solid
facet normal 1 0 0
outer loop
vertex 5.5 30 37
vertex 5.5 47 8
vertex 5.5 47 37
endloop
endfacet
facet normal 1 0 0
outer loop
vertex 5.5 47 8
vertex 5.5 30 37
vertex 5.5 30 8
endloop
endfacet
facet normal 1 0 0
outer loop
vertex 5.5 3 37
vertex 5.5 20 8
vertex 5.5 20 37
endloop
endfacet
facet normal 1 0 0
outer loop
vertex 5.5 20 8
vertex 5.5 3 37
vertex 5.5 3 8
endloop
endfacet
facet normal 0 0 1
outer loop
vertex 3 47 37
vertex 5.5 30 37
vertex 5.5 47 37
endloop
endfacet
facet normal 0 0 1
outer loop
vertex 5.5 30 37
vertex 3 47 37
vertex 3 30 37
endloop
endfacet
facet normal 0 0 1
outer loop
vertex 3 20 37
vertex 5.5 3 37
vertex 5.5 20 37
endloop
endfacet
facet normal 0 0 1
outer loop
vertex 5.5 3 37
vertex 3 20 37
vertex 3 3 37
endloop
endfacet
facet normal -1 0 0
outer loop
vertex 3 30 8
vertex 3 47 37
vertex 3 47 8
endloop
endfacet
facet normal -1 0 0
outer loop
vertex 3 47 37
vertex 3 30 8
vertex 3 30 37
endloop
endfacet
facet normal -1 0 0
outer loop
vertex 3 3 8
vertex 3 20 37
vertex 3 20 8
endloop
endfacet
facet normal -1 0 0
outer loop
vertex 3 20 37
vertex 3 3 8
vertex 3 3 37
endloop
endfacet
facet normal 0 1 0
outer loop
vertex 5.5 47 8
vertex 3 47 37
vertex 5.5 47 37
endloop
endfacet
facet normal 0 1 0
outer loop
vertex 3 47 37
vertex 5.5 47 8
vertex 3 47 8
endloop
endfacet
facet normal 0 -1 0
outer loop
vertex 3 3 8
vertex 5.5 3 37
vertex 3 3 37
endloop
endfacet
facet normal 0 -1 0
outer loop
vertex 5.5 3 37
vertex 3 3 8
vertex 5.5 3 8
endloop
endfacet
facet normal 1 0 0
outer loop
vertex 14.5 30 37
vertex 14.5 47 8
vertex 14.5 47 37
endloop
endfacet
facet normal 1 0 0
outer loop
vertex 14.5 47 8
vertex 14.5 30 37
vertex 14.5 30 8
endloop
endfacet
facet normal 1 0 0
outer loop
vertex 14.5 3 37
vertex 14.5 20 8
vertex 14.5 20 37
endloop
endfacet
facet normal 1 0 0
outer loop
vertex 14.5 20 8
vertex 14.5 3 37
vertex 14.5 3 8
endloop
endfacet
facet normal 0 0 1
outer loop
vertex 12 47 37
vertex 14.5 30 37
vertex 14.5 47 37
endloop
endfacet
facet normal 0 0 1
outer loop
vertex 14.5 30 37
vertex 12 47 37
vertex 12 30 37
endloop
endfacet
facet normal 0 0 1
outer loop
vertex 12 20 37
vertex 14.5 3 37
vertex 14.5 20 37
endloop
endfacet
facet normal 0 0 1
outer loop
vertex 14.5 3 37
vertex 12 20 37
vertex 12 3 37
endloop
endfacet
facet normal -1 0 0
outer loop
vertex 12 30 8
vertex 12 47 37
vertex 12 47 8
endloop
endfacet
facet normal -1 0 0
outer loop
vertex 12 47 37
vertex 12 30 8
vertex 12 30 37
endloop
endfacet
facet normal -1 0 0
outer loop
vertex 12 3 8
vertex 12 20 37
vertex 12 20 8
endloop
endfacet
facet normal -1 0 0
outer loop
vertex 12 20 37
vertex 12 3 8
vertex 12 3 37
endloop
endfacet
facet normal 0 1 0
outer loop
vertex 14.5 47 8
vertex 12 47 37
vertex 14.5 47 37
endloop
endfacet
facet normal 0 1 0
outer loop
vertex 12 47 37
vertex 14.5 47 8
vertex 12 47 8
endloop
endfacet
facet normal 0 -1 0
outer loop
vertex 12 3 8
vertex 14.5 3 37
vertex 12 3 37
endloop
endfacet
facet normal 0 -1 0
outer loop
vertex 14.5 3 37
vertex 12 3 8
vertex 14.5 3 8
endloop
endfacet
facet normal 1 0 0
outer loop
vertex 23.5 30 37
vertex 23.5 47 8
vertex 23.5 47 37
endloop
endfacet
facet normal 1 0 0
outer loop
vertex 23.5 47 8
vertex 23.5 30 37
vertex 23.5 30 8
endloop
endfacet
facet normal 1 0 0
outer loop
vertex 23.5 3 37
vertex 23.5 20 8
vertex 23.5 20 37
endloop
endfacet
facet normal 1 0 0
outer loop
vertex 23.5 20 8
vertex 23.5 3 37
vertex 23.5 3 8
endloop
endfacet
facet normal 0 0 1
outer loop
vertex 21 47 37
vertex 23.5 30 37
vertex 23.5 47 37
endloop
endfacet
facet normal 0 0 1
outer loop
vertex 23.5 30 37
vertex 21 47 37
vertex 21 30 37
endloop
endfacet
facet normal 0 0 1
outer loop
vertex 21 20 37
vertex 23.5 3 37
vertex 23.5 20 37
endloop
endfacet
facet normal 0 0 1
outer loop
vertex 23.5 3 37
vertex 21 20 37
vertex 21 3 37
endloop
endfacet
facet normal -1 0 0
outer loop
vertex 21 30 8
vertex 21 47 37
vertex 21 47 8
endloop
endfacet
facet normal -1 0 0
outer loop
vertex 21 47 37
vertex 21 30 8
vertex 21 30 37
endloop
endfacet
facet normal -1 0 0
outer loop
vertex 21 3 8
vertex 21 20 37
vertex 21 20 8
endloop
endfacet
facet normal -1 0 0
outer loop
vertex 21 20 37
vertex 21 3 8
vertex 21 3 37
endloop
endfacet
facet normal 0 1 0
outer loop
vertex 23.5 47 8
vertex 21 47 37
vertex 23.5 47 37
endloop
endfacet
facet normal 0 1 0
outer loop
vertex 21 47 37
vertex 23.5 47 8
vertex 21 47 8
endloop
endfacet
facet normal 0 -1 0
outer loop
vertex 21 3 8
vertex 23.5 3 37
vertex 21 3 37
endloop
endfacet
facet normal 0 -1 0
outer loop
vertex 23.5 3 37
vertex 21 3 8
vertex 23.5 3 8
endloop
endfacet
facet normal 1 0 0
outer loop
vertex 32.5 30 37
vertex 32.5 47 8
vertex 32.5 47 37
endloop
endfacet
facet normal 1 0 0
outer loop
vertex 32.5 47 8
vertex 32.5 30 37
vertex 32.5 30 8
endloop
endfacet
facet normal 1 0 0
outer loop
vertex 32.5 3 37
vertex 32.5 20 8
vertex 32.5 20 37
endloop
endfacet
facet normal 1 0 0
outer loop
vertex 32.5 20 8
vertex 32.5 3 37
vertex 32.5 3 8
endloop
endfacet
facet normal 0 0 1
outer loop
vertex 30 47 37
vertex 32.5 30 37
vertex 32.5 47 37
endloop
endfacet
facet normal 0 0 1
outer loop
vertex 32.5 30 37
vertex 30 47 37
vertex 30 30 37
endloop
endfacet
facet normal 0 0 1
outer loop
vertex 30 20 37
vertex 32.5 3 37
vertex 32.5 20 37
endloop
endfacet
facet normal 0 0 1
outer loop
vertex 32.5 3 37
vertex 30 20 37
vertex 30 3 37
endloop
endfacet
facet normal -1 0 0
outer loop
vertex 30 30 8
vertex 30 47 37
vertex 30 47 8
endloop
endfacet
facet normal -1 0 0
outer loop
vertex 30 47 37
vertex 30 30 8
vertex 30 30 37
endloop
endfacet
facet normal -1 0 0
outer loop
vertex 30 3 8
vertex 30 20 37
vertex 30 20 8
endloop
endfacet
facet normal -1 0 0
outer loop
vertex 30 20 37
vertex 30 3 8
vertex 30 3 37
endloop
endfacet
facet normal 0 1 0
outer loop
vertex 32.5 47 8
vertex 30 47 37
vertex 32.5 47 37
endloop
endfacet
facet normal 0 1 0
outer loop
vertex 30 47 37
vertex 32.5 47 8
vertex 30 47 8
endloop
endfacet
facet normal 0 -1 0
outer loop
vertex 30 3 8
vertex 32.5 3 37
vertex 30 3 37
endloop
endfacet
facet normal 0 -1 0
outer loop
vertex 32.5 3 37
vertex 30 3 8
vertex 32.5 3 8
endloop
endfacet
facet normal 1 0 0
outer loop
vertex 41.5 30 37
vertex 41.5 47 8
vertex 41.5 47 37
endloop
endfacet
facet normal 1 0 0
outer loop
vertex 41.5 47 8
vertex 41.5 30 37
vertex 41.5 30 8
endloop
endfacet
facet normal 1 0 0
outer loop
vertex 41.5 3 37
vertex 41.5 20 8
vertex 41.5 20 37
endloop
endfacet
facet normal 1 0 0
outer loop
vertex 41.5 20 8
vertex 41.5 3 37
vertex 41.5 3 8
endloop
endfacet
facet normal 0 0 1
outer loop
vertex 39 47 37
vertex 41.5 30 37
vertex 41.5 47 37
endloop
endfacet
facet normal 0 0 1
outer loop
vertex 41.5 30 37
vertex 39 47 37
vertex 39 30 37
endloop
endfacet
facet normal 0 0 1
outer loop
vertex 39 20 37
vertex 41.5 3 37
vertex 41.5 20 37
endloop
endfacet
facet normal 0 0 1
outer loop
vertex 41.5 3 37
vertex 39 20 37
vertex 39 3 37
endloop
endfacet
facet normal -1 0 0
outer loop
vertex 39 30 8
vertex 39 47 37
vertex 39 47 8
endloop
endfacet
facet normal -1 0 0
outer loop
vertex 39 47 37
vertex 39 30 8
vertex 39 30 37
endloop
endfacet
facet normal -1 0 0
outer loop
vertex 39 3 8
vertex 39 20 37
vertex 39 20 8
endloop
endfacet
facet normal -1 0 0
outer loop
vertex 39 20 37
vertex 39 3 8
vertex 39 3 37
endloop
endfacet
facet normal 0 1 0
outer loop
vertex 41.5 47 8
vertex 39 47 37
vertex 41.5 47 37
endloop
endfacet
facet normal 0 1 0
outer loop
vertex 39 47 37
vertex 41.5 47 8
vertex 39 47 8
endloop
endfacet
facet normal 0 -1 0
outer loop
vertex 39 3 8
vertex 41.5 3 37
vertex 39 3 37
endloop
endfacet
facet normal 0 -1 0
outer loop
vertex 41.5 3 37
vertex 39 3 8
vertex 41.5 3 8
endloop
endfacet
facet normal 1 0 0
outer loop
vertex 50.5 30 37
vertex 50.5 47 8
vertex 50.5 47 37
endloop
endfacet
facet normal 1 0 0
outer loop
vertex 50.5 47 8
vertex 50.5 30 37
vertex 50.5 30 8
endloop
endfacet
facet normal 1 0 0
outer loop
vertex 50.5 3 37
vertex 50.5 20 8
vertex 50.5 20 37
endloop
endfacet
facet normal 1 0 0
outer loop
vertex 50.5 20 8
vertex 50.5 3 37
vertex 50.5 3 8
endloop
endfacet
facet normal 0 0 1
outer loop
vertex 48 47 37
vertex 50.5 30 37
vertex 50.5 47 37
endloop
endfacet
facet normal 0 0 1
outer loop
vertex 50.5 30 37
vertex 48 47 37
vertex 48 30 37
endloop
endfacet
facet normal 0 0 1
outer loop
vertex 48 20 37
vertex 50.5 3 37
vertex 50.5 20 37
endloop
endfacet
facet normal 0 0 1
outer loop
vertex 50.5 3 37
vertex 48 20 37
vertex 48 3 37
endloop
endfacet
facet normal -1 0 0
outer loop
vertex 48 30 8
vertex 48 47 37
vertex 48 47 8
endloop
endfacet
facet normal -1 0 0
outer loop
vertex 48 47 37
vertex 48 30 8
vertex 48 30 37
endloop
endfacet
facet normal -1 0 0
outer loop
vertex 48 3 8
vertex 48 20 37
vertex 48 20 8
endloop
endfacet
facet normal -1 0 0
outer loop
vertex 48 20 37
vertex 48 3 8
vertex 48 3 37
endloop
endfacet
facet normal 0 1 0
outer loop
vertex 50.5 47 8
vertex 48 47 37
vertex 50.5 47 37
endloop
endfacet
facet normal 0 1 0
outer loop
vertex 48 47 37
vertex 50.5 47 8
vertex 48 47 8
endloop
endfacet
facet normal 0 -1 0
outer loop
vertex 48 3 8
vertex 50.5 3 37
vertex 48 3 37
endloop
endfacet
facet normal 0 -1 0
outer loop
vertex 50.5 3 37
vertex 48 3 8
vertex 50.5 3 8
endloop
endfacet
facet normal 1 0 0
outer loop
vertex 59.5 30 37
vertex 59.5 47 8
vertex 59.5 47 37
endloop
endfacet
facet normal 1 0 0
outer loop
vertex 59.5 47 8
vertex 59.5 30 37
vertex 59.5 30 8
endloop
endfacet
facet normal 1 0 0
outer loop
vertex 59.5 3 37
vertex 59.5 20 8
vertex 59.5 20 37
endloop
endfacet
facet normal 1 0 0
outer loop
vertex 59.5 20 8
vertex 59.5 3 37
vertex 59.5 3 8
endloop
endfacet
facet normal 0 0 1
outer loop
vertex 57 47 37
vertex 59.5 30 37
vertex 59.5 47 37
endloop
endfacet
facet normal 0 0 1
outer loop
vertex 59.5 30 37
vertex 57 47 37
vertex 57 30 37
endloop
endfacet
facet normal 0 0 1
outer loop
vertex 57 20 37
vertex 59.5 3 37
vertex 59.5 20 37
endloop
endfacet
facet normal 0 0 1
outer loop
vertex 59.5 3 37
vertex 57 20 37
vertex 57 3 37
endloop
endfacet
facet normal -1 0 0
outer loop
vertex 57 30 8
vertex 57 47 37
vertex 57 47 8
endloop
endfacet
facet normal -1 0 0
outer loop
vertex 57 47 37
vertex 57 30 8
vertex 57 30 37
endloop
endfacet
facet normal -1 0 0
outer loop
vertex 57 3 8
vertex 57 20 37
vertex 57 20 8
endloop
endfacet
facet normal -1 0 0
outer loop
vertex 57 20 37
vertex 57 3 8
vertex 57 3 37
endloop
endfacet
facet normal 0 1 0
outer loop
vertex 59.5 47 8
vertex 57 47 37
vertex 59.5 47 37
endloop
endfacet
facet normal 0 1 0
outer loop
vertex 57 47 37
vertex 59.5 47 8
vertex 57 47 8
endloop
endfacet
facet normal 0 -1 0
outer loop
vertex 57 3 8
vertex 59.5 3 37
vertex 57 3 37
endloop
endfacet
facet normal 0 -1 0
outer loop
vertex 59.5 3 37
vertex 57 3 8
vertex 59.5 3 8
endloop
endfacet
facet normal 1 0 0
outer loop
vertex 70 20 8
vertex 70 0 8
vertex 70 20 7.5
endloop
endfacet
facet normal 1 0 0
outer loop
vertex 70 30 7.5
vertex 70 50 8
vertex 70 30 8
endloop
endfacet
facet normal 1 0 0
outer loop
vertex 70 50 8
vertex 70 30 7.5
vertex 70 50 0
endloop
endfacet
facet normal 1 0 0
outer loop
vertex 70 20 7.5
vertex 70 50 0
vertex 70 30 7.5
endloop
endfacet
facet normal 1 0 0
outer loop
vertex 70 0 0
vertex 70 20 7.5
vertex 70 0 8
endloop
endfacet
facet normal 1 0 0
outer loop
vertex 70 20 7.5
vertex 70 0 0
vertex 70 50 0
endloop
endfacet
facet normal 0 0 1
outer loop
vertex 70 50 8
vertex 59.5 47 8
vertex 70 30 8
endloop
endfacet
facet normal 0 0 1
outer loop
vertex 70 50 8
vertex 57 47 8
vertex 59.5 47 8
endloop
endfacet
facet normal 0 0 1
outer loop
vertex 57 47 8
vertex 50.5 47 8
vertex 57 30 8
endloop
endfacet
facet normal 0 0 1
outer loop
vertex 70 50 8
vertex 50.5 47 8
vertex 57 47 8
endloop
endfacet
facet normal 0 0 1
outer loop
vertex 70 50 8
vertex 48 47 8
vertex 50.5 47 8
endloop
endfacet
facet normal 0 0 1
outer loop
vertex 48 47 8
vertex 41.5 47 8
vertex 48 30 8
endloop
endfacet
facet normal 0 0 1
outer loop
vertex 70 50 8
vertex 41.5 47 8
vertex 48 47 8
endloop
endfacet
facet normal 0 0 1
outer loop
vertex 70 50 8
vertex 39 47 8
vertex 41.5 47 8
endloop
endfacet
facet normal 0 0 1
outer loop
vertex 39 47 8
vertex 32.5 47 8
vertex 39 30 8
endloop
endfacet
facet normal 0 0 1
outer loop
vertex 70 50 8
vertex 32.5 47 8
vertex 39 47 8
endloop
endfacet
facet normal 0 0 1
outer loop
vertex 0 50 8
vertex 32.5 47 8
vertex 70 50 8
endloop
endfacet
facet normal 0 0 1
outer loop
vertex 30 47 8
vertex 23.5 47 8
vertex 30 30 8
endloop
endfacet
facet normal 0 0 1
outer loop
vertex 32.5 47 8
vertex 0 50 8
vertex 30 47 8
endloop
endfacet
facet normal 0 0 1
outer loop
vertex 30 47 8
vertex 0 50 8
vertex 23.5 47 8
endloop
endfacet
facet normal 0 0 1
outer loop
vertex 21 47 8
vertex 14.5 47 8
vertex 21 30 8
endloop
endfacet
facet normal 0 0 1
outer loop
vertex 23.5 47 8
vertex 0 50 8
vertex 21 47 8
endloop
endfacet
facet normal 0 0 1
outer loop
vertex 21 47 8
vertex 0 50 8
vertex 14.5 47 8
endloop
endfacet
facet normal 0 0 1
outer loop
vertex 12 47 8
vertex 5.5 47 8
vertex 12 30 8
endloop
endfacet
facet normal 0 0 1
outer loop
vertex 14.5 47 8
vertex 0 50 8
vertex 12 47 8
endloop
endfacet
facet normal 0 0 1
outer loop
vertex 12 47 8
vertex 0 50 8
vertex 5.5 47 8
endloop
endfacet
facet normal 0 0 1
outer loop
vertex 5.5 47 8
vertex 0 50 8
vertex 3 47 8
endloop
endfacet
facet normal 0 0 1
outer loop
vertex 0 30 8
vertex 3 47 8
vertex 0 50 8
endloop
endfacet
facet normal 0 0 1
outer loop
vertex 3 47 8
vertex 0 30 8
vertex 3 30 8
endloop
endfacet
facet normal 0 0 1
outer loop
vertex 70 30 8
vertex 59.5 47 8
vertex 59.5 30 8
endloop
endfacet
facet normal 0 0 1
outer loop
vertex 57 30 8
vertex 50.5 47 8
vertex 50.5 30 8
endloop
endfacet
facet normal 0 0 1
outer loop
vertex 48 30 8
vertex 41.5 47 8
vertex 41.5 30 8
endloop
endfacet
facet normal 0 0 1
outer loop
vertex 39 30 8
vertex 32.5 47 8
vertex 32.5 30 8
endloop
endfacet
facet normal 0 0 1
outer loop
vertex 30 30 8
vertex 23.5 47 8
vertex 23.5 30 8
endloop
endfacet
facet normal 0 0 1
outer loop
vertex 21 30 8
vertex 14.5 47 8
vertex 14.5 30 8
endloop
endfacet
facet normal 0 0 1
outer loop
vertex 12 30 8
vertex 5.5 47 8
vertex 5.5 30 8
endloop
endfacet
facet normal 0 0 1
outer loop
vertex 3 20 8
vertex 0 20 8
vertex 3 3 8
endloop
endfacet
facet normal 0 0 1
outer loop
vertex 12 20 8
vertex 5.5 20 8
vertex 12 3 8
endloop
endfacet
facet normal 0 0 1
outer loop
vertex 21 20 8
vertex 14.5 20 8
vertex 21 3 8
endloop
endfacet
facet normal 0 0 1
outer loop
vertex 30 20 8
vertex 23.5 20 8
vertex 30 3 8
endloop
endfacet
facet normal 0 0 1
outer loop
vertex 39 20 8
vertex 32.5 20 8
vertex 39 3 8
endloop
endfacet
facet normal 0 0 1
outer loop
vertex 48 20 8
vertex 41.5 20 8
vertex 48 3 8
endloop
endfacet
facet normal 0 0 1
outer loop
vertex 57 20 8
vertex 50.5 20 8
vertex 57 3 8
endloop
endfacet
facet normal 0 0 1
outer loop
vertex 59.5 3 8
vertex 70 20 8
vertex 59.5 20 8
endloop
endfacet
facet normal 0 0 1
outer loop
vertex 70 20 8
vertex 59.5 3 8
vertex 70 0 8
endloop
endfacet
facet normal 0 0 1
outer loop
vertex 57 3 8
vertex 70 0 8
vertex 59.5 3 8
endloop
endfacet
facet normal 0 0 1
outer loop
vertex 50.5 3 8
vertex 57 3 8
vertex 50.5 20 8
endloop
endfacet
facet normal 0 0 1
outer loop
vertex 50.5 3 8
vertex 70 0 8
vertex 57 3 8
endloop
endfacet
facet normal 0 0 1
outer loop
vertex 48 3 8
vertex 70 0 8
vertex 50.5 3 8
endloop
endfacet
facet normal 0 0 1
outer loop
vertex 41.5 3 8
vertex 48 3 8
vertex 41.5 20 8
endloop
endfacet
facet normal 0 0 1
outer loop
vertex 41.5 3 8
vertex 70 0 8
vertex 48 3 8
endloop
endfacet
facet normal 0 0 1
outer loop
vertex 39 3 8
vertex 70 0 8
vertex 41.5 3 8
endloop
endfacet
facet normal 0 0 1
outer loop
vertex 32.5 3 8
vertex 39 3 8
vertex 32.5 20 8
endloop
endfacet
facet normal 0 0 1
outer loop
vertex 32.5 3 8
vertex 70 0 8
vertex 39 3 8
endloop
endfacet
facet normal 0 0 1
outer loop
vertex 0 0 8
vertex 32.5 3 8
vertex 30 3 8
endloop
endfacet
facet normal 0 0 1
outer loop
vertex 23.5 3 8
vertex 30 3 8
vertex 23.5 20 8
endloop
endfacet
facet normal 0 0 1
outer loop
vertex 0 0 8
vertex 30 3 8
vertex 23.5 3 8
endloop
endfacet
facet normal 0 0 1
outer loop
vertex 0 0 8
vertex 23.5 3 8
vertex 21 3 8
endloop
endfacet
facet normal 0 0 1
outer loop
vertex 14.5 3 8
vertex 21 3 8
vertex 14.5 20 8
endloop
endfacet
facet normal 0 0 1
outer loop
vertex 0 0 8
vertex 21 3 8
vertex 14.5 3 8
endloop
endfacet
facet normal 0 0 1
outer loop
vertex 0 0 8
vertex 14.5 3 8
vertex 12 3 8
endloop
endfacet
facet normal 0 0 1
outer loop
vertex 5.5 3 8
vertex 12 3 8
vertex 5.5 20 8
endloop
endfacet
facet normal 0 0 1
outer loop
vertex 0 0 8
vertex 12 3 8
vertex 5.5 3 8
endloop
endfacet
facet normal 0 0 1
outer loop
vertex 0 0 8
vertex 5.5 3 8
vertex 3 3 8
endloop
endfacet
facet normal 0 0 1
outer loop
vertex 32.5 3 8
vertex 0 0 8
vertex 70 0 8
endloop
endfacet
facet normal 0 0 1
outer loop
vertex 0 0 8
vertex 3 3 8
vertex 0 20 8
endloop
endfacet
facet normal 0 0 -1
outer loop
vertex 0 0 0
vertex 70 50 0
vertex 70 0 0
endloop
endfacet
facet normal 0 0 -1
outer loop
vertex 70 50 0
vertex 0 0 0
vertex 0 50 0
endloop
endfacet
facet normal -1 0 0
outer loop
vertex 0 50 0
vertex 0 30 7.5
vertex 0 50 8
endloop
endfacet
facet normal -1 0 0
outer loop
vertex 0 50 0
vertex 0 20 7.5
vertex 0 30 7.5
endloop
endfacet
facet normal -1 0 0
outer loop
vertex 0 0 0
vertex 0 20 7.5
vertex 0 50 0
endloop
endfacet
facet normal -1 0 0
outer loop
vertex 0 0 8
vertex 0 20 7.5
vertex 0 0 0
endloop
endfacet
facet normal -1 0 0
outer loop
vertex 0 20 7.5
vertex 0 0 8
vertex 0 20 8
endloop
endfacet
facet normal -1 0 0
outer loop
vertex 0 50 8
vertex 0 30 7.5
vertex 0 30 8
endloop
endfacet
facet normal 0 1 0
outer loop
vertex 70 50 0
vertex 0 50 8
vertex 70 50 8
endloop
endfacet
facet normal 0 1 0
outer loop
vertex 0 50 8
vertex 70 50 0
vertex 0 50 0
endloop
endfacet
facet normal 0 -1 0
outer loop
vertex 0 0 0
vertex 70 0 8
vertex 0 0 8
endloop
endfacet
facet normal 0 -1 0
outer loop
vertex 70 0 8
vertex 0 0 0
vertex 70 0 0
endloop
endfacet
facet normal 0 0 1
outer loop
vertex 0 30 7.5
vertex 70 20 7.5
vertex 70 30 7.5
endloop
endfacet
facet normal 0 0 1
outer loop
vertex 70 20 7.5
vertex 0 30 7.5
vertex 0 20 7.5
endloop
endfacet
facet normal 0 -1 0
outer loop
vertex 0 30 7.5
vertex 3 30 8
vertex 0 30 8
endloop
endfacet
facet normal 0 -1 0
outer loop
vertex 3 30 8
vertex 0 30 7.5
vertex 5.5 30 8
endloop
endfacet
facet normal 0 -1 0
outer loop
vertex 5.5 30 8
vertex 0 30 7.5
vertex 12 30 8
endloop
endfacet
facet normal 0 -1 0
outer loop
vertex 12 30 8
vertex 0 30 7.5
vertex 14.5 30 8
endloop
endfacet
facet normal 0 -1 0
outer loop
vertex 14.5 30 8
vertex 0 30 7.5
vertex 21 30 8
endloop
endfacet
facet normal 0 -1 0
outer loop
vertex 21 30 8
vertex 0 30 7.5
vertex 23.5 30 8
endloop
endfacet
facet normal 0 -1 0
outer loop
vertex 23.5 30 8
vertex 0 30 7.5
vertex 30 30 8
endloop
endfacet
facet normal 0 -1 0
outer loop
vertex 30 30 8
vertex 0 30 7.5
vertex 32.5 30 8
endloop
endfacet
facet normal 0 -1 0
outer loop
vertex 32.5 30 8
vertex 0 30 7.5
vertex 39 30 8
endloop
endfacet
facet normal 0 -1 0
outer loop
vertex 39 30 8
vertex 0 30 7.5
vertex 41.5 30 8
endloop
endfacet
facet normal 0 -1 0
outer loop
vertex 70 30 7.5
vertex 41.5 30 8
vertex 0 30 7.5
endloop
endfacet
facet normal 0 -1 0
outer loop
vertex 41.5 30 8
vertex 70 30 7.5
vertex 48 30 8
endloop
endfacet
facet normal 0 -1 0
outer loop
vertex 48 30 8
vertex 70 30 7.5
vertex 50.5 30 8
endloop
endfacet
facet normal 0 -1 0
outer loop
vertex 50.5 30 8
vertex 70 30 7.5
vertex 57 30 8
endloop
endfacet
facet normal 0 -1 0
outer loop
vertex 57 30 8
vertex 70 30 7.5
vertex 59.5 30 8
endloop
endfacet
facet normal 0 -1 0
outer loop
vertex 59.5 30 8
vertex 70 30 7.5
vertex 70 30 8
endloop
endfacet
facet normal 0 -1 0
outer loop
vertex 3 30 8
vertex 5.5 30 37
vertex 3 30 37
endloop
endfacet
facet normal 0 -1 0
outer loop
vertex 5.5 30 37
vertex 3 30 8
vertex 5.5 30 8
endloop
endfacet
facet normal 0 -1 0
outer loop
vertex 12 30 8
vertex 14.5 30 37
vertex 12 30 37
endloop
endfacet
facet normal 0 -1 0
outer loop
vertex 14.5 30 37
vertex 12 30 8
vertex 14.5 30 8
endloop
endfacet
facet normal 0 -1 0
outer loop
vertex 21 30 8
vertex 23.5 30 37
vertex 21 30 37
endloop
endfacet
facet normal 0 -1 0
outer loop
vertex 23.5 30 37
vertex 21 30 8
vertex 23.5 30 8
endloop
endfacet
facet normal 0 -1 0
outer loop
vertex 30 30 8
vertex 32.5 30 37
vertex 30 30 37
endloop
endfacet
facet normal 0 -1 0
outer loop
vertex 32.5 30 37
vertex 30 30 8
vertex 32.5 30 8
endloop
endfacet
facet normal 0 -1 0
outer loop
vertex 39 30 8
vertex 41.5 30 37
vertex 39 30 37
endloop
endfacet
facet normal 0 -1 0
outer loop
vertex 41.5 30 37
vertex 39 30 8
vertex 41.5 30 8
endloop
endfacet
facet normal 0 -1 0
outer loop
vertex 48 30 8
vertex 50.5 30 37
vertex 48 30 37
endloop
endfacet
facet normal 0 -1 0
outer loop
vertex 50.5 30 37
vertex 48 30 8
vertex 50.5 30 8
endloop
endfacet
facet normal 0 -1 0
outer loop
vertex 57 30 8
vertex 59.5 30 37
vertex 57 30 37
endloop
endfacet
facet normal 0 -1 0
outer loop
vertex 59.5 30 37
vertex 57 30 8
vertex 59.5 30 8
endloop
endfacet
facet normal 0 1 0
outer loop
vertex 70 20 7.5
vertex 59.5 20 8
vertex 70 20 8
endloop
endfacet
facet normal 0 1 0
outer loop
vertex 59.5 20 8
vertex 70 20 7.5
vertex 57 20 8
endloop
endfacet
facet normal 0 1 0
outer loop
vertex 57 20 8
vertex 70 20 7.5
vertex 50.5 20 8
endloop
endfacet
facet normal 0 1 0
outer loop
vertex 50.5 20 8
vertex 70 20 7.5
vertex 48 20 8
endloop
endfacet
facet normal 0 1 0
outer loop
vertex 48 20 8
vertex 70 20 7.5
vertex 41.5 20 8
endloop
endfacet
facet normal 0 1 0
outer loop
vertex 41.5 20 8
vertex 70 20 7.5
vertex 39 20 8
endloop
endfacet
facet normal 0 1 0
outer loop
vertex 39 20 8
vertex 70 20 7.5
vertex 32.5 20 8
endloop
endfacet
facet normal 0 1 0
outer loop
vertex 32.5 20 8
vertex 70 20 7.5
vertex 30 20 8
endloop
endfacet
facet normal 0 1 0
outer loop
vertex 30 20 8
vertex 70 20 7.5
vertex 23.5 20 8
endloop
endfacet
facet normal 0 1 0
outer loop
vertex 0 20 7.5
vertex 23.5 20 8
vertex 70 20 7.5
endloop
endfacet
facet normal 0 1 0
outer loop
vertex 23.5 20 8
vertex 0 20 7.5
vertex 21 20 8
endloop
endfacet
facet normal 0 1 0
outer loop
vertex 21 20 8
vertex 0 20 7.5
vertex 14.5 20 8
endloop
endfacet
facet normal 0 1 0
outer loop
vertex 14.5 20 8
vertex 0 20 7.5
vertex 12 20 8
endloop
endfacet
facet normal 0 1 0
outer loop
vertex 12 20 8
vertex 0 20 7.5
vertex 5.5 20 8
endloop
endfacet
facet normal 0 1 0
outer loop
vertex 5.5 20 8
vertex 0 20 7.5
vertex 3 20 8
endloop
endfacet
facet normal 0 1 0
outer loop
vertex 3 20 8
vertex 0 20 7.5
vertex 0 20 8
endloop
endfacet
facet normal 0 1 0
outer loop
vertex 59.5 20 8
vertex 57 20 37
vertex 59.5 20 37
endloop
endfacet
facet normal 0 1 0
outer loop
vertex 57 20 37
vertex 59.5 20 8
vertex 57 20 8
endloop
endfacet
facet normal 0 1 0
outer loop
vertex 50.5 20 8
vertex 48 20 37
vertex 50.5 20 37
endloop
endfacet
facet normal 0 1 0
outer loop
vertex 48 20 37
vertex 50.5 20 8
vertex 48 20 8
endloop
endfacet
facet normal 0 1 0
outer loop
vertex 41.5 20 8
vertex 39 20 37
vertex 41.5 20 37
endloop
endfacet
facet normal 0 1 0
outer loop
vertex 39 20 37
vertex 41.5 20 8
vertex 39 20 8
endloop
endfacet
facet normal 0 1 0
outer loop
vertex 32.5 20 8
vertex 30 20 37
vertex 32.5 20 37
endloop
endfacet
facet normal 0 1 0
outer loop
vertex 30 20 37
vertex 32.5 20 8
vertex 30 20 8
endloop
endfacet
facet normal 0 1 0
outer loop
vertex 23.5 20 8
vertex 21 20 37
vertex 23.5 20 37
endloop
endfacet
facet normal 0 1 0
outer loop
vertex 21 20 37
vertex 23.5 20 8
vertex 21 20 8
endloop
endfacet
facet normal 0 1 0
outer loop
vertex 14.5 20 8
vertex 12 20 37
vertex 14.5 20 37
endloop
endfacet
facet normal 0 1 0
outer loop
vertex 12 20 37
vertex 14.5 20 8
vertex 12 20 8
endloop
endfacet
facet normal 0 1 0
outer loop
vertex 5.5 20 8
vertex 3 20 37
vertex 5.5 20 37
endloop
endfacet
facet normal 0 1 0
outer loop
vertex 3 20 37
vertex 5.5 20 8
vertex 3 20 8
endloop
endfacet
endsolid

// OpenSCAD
$fn = 32;

// ----------------------------------------------------------------------
// Heatsink: slotted fin block
// ----------------------------------------------------------------------

// --- parameters (mm) ---
base_l = 70;              // base length, X
base_w = 50;              // base width, Y
base_t = 8;               // base plate thickness
fin_h = 30;               // fin height above the base
fin_t = 2.5;              // fin thickness
edge = 3;                 // margin from the base ends
pitch = 9;                // fin pitch
slot_w = 10;              // central slot width, Y

n_fins = floor((base_l - 2 * edge - fin_t) / pitch) + 1;  // fin count
total_h = base_t + fin_h - 1;  // overall height

difference() {
union() {
  cube([base_l, base_w, base_t]);
  for (i = [0 : n_fins - 1])
    translate([edge + i * pitch, edge, base_t - 1])
      cube([fin_t, base_w - 2 * edge, fin_h]);
}
  translate([-1, base_w / 2 - slot_w / 2, base_t - 0.5])
    cube([base_l + 2, slot_w, fin_h + 2]);
}
